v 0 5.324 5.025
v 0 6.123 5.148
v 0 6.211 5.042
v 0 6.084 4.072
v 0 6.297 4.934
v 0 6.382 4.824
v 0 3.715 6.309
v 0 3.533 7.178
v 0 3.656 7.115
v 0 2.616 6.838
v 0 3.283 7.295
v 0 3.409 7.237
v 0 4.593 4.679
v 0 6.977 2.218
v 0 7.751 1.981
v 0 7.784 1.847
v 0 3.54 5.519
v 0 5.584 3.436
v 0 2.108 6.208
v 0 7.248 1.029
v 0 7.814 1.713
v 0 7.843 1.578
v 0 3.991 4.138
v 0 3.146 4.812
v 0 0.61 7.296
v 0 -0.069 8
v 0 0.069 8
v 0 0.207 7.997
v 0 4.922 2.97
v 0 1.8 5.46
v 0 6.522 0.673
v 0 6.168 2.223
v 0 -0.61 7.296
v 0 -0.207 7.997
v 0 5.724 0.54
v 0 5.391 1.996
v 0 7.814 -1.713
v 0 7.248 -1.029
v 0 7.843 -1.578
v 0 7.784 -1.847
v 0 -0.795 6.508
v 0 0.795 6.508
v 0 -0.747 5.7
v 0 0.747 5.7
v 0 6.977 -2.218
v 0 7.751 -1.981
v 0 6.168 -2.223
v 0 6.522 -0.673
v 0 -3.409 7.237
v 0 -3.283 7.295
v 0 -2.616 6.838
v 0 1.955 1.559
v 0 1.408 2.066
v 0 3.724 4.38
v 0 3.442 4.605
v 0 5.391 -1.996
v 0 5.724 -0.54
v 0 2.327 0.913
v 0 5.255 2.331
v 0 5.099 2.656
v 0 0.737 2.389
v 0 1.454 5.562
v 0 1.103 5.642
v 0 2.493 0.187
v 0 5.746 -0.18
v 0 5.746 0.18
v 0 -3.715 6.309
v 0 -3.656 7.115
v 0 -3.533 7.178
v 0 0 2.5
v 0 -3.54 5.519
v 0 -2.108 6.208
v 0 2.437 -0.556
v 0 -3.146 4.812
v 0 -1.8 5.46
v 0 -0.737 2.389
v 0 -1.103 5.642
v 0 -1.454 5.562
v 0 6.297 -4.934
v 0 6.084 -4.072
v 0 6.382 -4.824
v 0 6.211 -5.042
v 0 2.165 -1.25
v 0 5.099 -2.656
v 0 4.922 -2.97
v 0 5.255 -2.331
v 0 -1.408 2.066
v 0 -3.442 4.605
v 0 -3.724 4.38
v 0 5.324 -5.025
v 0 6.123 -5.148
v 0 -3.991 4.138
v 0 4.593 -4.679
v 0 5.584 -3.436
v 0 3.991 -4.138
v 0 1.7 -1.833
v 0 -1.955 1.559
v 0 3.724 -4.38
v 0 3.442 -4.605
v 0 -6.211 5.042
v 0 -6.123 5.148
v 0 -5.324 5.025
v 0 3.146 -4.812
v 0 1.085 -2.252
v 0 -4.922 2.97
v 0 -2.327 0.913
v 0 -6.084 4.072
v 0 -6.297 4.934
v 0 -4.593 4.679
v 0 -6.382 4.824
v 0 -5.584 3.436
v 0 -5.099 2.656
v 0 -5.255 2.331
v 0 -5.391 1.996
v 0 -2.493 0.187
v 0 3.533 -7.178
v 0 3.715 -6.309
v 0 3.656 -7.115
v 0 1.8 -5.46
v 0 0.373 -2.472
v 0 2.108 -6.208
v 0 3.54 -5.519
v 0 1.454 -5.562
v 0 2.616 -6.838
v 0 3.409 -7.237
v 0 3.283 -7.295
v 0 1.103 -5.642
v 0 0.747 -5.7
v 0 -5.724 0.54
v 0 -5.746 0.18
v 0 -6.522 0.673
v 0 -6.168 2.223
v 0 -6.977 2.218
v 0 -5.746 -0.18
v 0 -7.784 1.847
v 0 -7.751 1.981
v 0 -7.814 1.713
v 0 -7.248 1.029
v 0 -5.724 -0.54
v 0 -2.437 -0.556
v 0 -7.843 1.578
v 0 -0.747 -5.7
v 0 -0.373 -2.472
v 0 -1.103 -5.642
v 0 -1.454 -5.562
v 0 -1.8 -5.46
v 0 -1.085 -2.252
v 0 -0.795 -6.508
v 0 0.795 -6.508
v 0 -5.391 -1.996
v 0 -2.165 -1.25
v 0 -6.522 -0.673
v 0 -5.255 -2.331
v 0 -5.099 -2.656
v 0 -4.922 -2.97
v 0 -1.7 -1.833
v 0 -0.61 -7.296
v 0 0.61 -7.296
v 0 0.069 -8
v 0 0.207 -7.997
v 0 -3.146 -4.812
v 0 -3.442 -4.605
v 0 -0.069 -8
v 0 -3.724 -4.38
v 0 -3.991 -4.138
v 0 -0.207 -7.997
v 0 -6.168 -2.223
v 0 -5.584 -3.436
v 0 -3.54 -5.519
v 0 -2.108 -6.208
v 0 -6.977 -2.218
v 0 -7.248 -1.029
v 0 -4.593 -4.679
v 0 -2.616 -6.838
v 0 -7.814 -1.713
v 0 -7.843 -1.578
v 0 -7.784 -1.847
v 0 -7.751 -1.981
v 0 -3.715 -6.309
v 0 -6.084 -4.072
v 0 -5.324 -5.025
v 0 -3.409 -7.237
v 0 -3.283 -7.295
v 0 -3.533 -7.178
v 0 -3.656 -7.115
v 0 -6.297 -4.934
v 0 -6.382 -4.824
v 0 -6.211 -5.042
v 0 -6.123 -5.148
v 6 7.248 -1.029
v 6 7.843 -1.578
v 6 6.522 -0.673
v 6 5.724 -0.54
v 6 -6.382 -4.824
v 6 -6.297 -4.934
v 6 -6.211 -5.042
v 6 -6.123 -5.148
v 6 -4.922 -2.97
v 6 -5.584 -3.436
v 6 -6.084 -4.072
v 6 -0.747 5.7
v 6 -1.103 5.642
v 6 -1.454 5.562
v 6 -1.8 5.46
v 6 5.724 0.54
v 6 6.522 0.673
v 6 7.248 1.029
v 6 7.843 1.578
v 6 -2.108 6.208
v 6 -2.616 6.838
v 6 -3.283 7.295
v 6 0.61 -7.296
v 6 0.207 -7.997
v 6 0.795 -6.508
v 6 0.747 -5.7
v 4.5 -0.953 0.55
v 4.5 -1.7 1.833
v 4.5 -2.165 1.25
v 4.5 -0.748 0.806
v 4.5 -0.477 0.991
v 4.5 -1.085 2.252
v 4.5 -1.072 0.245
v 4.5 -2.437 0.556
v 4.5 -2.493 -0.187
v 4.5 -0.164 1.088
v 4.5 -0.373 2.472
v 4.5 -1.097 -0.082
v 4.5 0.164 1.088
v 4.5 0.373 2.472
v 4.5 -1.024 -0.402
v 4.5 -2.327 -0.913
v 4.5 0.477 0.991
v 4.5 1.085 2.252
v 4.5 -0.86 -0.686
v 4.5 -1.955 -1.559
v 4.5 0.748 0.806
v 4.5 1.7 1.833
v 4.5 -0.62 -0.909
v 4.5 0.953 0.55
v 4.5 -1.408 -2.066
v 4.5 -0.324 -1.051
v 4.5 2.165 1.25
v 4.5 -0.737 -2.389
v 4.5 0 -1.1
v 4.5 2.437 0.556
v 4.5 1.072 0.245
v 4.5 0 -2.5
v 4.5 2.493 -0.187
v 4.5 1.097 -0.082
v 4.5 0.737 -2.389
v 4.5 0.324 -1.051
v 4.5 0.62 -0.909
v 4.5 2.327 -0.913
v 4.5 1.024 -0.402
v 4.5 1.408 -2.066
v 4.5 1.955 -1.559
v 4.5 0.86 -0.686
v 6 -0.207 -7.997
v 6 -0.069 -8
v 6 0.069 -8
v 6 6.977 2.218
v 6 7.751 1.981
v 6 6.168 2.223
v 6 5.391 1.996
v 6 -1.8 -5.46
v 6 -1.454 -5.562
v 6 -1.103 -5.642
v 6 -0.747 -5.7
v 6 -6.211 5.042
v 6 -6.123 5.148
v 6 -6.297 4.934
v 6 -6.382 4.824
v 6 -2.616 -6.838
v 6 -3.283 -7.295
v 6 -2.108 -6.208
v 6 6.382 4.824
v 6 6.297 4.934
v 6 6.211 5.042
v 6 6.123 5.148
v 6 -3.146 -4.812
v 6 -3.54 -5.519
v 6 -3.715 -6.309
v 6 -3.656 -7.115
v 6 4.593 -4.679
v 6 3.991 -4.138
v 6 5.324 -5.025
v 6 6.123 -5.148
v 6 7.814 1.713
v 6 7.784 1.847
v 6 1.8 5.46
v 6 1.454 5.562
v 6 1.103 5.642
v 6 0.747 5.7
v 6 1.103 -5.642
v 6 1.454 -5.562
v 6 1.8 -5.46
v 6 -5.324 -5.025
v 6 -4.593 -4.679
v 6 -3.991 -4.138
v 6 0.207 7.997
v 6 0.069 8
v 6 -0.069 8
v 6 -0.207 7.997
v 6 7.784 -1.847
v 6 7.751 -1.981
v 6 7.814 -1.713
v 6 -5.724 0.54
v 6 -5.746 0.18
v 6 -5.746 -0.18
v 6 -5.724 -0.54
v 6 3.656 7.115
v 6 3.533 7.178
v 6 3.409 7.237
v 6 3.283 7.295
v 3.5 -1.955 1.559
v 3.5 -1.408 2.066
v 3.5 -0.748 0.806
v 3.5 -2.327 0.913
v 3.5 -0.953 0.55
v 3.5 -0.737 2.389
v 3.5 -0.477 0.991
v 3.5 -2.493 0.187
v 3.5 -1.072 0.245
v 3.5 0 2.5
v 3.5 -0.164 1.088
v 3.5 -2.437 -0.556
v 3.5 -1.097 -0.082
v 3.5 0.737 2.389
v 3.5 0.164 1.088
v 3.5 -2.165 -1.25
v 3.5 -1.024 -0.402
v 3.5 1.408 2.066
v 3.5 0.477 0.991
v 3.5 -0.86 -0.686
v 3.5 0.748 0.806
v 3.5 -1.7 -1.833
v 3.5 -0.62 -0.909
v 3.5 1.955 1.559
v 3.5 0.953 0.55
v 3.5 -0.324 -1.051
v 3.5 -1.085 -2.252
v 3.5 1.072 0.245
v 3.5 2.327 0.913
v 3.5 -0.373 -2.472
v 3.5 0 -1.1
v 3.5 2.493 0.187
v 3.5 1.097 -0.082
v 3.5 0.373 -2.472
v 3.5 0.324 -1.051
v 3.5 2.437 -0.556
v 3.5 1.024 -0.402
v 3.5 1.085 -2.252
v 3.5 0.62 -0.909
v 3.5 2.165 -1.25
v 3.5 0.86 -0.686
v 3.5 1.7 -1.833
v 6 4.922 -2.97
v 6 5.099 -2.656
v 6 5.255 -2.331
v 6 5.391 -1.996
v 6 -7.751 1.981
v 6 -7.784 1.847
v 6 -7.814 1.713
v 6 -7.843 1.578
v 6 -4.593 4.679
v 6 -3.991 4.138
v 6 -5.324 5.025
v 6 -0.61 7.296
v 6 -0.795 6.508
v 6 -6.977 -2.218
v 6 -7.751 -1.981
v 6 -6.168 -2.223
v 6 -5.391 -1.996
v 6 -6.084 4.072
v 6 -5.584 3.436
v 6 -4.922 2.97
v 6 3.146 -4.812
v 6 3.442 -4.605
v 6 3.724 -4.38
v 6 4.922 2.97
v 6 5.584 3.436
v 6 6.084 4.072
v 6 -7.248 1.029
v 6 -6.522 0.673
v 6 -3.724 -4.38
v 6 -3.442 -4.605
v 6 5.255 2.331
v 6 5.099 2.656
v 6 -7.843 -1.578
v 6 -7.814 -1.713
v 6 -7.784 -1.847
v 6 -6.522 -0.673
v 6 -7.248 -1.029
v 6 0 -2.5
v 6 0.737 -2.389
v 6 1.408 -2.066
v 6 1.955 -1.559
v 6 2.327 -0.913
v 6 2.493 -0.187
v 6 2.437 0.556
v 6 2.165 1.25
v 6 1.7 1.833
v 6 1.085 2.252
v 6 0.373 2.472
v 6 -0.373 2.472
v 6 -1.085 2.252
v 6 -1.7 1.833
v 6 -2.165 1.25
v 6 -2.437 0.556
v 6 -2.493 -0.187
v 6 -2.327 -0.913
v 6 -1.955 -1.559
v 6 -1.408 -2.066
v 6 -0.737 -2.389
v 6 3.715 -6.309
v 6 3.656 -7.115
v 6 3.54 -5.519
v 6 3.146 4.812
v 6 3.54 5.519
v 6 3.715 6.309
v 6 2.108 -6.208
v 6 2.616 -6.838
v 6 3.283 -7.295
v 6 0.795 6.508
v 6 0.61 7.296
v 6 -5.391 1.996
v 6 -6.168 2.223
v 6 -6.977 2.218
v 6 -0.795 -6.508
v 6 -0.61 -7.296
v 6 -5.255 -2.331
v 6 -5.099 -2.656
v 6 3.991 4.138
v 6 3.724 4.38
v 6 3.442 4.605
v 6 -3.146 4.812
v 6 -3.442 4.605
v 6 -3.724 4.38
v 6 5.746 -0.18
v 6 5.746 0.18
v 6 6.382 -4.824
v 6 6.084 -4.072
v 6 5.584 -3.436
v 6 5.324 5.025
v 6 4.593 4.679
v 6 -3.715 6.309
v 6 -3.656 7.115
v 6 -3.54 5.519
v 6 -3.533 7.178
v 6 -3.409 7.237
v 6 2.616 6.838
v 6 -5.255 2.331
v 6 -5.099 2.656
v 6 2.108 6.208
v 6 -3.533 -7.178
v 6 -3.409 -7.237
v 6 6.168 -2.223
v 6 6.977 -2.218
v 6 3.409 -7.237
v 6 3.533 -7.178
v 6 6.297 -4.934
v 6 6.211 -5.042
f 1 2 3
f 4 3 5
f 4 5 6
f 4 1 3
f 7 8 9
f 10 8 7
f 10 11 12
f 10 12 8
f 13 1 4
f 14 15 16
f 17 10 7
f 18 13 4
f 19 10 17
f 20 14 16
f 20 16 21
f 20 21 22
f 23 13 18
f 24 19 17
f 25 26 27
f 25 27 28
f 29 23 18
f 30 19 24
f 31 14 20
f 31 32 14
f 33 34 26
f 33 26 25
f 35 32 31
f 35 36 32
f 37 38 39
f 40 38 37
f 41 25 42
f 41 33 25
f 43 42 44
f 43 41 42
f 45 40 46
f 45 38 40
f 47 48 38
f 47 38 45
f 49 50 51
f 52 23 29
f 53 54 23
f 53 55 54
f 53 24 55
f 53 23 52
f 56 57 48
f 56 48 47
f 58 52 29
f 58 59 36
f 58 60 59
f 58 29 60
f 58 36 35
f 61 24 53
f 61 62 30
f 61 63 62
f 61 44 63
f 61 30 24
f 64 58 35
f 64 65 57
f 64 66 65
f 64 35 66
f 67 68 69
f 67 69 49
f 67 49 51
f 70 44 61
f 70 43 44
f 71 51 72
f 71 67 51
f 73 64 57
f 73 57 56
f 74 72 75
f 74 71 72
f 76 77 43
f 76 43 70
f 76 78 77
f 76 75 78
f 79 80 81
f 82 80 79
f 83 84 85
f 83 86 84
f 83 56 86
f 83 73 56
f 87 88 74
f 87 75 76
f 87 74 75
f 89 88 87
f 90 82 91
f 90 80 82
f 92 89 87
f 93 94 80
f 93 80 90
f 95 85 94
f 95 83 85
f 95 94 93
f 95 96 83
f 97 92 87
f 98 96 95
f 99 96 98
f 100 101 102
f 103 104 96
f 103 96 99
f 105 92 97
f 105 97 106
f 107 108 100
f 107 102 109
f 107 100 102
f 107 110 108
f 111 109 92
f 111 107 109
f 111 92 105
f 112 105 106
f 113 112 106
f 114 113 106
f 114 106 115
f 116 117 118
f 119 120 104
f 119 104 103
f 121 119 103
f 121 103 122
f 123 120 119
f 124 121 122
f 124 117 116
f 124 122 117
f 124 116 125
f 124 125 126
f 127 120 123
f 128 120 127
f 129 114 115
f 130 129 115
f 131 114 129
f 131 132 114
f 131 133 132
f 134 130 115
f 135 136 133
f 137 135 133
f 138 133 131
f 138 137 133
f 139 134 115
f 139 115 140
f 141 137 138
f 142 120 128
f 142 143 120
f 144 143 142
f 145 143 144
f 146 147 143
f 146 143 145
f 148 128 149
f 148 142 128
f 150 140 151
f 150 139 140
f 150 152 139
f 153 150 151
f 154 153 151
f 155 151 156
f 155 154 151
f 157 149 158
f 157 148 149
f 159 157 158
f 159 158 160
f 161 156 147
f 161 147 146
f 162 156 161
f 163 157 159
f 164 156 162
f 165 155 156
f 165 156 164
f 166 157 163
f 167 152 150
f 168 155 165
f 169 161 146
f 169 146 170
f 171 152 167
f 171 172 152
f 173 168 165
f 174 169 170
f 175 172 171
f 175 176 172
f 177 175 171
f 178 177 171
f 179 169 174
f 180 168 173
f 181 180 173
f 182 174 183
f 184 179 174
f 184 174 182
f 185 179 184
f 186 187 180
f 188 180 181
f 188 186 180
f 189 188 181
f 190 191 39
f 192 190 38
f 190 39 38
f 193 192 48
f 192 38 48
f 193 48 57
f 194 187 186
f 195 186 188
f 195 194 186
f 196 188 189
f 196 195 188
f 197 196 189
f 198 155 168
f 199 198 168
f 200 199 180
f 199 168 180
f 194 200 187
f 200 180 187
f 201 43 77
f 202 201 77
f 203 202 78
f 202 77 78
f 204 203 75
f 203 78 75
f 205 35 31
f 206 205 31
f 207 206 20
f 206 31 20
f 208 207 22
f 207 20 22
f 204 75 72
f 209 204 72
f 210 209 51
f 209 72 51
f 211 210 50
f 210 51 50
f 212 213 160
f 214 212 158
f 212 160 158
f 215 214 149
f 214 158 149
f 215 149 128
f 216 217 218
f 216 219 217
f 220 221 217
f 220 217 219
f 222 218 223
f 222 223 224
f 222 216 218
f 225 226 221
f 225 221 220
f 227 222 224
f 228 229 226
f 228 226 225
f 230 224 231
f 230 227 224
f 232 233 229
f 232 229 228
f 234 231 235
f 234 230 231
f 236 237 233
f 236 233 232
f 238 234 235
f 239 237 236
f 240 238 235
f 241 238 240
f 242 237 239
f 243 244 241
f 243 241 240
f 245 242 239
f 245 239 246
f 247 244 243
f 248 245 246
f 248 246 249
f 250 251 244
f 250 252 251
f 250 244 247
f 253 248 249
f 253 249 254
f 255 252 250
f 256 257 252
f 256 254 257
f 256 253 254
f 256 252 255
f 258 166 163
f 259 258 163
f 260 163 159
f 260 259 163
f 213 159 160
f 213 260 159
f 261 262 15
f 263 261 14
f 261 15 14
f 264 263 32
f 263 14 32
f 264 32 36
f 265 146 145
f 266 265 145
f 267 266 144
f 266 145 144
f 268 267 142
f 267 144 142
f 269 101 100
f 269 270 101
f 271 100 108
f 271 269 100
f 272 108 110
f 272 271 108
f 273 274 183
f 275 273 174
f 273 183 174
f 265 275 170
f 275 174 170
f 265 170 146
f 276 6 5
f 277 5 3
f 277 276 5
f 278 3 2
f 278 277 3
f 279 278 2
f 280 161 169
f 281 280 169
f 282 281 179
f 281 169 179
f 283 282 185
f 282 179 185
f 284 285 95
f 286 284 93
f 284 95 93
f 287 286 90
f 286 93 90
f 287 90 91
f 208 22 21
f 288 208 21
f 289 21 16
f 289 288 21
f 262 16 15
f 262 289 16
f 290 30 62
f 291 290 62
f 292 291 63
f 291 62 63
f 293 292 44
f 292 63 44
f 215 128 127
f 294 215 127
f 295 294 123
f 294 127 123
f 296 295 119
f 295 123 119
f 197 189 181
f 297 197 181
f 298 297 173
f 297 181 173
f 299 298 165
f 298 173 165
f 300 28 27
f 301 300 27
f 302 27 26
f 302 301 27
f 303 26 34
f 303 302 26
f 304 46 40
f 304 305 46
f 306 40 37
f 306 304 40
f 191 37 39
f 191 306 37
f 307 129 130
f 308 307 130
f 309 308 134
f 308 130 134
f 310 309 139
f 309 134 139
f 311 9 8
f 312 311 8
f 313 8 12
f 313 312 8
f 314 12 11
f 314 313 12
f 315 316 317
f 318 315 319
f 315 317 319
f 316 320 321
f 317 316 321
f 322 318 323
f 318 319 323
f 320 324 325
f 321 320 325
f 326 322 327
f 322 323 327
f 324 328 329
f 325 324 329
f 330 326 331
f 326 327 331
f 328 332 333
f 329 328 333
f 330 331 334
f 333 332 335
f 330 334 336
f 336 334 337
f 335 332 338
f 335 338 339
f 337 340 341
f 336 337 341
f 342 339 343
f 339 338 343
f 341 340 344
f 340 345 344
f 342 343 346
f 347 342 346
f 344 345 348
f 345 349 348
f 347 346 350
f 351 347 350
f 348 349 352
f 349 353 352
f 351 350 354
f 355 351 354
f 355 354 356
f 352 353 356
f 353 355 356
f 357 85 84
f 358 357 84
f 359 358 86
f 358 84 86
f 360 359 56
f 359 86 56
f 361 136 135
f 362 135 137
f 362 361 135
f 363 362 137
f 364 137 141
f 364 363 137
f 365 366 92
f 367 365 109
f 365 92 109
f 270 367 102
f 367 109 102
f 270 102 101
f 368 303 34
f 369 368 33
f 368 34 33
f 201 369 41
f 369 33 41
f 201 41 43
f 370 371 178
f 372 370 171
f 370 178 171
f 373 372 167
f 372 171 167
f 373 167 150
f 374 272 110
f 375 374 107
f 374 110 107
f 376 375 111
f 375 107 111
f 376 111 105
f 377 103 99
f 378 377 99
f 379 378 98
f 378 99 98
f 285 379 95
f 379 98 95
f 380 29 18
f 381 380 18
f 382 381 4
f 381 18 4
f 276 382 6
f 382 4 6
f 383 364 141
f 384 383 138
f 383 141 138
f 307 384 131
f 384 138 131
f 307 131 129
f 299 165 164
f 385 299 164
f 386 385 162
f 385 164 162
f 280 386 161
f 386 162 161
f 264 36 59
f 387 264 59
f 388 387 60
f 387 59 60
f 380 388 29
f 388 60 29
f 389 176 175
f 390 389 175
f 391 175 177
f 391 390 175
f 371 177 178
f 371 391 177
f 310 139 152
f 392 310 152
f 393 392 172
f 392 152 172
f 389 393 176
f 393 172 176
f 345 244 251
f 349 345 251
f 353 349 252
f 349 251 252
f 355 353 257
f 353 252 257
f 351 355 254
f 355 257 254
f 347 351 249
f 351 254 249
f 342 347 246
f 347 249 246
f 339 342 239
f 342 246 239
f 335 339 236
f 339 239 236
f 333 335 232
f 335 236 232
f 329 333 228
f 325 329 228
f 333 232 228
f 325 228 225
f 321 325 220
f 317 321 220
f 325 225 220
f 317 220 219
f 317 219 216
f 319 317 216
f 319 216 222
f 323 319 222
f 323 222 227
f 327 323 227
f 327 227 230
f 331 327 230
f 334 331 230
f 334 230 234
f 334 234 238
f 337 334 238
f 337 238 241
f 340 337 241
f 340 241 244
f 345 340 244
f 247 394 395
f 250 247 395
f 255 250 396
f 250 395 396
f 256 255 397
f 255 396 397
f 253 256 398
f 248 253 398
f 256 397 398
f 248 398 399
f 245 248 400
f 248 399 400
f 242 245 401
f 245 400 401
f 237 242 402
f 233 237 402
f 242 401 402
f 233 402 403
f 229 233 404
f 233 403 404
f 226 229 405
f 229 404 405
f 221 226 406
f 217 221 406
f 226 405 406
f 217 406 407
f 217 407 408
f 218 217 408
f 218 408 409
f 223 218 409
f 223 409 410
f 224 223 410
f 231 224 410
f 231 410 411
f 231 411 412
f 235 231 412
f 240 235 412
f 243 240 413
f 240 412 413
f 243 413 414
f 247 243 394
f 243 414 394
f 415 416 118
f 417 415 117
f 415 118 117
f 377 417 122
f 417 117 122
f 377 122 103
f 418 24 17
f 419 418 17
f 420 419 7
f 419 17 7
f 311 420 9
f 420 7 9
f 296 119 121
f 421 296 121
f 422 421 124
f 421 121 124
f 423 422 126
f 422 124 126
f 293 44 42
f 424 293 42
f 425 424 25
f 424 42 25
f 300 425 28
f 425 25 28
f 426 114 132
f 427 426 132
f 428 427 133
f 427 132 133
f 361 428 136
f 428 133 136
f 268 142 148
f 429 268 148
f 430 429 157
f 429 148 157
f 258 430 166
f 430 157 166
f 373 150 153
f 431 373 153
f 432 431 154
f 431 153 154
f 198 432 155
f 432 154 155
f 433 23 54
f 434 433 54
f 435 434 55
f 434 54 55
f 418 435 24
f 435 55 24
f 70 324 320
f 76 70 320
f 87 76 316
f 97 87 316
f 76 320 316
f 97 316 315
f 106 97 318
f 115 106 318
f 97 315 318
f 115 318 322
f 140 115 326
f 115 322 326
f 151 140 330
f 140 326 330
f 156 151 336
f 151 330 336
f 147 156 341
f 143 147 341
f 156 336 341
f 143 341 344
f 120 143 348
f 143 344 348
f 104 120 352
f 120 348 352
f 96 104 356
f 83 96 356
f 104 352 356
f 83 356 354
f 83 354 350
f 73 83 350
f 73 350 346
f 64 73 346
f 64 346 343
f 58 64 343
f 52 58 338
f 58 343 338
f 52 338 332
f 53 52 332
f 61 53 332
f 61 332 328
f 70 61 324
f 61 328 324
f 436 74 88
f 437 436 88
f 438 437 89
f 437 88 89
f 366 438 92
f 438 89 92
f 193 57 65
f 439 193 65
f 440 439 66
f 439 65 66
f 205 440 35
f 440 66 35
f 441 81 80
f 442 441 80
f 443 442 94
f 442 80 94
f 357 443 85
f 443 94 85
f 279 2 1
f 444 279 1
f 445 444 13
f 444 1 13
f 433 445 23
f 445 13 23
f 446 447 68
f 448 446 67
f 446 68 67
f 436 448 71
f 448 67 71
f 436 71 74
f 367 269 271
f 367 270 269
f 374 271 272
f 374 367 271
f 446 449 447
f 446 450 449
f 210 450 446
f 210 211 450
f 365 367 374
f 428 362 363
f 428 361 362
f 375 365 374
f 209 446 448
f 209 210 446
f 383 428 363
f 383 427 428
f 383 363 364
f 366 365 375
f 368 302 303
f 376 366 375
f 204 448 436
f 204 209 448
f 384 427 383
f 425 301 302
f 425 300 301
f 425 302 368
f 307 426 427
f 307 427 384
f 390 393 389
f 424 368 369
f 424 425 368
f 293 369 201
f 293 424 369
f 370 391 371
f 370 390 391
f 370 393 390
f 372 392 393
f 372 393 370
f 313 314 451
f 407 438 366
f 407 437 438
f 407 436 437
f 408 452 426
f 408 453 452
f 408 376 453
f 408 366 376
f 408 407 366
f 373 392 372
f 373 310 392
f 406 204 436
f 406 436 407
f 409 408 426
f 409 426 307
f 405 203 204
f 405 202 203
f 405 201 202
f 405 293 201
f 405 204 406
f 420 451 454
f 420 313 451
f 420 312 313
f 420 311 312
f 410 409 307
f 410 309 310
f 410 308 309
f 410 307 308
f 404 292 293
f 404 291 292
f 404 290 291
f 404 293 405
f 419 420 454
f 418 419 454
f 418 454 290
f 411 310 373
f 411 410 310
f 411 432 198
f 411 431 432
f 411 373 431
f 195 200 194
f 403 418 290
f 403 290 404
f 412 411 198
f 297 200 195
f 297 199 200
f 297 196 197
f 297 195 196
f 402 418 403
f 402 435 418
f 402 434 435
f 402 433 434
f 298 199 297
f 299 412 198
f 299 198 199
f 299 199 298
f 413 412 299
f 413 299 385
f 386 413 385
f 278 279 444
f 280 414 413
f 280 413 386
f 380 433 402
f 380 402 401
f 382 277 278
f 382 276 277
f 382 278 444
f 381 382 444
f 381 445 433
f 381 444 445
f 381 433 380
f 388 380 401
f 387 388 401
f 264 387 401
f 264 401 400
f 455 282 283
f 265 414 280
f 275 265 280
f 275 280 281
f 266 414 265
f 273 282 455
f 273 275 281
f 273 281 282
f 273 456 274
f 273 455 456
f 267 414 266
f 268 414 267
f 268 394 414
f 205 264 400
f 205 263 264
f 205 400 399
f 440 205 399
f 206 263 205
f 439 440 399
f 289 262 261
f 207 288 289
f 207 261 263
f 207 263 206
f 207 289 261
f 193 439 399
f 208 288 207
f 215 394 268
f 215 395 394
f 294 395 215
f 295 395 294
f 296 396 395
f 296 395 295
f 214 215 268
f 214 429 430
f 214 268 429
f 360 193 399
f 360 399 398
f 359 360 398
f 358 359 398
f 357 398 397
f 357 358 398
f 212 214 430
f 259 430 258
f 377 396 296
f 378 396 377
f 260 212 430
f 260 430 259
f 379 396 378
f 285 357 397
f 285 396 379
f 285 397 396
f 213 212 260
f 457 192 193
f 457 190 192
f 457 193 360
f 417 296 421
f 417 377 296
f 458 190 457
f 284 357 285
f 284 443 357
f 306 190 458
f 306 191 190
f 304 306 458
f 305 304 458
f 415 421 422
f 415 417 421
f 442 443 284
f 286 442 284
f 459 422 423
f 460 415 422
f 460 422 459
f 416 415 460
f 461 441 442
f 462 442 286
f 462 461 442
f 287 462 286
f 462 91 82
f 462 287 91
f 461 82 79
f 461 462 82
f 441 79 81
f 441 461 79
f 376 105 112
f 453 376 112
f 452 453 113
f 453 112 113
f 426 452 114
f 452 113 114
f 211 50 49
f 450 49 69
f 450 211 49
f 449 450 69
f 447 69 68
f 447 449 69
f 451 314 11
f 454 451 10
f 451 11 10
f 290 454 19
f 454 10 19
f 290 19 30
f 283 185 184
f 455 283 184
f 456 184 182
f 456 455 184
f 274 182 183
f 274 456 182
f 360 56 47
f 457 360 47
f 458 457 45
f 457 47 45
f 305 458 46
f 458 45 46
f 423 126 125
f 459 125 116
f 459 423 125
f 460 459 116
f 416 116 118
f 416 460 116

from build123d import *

# Parameters (mm, degrees)
BASPROSKE_W         = 6
BASPROSKE_H         = 8
TOOTHCUT_DEPTH      = 13.806248475
TEETHCUTS_COUNT     = 14
TEETHCUTS_ANGLE     = 334.285714286
BORSKE_R            = 2.5
BORE_DEPTH          = 50.0000508
SKETCH1_R           = 2.5
BOSS_EXTRUDE1_DEPTH = 2.5
SKETCH2_R           = 2.5
CUT_EXTRUDE1_DEPTH  = 1.5
SKETCH3_R           = 1.1
CUT_EXTRUDE2_DEPTH  = 13.073146116


with BuildPart() as part:
    # BasProSke → Base-Revolve (revolve)
    with BuildSketch(Plane(origin=(0, 0, 0), x_dir=(1, 0, 0), z_dir=(0, 1, 0)), mode=Mode.PRIVATE) as base_revolve_sk:
        with Locations((3, 4)):
            Rectangle(BASPROSKE_W, BASPROSKE_H)
    revolve(base_revolve_sk.sketch.rotate(Axis((-10, 0, 0), (1, 0, 0)), 180), axis=Axis((-10, 0, 0), (1, 0, 0)))

    # TooCutSke → ToothCut (cut, through all)
    with BuildSketch(Plane(origin=(0, 0, 0), x_dir=(0, 0, -1), z_dir=(1, 0, 0))):
        with BuildLine():
            ThreePointArc((0.540393256, 5.723545765), (0, 5.749), (-0.540393256, 5.723545765))
            ThreePointArc((-0.540393256, 5.723545765), (-0.832220085, 6.912663993), (-1.603550271, 7.863566092))
            ThreePointArc((-1.603550271, 7.863566092), (0, 8.0254), (1.603550271, 7.863566092))
            ThreePointArc((1.603550271, 7.863566092), (0.832220085, 6.912663993), (0.540393256, 5.723545765))
        make_face()
    toothcut = extrude(amount=TOOTHCUT_DEPTH, mode=Mode.SUBTRACT)

    # TeethCuts: ToothCut ×14 about axis
    teethcuts_axis = Axis((-10, 0, 0), (1, 0, 0))
    for i in range(1, TEETHCUTS_COUNT):
        add(toothcut.rotate(teethcuts_axis, i * TEETHCUTS_ANGLE / (TEETHCUTS_COUNT - 1)), mode=Mode.SUBTRACT)

    # BorSke → Bore (cut, symmetric)
    with BuildSketch(Plane(origin=(0, 0, 0), x_dir=(0, 0, -1), z_dir=(1, 0, 0))):
        with Locations(Location((0, 0, 0), (0, 0, 180))):
            Circle(BORSKE_R)
    extrude(amount=BORE_DEPTH, both=True, mode=Mode.SUBTRACT)

    # Sketch1 → Boss-Extrude1 (add)
    with BuildSketch(Plane(origin=(6, 0, 0), x_dir=(0, 0, -1), z_dir=(1, 0, 0))):
        Circle(SKETCH1_R)
    extrude(amount=-BOSS_EXTRUDE1_DEPTH)

    # Sketch2 → Cut-Extrude1 (cut)
    with BuildSketch(Plane(origin=(6, 0, 0), x_dir=(0, 0, -1), z_dir=(1, 0, 0))):
        Circle(SKETCH2_R)
    extrude(amount=-CUT_EXTRUDE1_DEPTH, mode=Mode.SUBTRACT)

    # Sketch3 → Cut-Extrude2 (cut, through all)
    with BuildSketch(Plane(origin=(4.5, 0, 0), x_dir=(0, 0, -1), z_dir=(1, 0, 0))):
        Circle(SKETCH3_R)
    extrude(amount=-CUT_EXTRUDE2_DEPTH, mode=Mode.SUBTRACT)


solid = part.part
